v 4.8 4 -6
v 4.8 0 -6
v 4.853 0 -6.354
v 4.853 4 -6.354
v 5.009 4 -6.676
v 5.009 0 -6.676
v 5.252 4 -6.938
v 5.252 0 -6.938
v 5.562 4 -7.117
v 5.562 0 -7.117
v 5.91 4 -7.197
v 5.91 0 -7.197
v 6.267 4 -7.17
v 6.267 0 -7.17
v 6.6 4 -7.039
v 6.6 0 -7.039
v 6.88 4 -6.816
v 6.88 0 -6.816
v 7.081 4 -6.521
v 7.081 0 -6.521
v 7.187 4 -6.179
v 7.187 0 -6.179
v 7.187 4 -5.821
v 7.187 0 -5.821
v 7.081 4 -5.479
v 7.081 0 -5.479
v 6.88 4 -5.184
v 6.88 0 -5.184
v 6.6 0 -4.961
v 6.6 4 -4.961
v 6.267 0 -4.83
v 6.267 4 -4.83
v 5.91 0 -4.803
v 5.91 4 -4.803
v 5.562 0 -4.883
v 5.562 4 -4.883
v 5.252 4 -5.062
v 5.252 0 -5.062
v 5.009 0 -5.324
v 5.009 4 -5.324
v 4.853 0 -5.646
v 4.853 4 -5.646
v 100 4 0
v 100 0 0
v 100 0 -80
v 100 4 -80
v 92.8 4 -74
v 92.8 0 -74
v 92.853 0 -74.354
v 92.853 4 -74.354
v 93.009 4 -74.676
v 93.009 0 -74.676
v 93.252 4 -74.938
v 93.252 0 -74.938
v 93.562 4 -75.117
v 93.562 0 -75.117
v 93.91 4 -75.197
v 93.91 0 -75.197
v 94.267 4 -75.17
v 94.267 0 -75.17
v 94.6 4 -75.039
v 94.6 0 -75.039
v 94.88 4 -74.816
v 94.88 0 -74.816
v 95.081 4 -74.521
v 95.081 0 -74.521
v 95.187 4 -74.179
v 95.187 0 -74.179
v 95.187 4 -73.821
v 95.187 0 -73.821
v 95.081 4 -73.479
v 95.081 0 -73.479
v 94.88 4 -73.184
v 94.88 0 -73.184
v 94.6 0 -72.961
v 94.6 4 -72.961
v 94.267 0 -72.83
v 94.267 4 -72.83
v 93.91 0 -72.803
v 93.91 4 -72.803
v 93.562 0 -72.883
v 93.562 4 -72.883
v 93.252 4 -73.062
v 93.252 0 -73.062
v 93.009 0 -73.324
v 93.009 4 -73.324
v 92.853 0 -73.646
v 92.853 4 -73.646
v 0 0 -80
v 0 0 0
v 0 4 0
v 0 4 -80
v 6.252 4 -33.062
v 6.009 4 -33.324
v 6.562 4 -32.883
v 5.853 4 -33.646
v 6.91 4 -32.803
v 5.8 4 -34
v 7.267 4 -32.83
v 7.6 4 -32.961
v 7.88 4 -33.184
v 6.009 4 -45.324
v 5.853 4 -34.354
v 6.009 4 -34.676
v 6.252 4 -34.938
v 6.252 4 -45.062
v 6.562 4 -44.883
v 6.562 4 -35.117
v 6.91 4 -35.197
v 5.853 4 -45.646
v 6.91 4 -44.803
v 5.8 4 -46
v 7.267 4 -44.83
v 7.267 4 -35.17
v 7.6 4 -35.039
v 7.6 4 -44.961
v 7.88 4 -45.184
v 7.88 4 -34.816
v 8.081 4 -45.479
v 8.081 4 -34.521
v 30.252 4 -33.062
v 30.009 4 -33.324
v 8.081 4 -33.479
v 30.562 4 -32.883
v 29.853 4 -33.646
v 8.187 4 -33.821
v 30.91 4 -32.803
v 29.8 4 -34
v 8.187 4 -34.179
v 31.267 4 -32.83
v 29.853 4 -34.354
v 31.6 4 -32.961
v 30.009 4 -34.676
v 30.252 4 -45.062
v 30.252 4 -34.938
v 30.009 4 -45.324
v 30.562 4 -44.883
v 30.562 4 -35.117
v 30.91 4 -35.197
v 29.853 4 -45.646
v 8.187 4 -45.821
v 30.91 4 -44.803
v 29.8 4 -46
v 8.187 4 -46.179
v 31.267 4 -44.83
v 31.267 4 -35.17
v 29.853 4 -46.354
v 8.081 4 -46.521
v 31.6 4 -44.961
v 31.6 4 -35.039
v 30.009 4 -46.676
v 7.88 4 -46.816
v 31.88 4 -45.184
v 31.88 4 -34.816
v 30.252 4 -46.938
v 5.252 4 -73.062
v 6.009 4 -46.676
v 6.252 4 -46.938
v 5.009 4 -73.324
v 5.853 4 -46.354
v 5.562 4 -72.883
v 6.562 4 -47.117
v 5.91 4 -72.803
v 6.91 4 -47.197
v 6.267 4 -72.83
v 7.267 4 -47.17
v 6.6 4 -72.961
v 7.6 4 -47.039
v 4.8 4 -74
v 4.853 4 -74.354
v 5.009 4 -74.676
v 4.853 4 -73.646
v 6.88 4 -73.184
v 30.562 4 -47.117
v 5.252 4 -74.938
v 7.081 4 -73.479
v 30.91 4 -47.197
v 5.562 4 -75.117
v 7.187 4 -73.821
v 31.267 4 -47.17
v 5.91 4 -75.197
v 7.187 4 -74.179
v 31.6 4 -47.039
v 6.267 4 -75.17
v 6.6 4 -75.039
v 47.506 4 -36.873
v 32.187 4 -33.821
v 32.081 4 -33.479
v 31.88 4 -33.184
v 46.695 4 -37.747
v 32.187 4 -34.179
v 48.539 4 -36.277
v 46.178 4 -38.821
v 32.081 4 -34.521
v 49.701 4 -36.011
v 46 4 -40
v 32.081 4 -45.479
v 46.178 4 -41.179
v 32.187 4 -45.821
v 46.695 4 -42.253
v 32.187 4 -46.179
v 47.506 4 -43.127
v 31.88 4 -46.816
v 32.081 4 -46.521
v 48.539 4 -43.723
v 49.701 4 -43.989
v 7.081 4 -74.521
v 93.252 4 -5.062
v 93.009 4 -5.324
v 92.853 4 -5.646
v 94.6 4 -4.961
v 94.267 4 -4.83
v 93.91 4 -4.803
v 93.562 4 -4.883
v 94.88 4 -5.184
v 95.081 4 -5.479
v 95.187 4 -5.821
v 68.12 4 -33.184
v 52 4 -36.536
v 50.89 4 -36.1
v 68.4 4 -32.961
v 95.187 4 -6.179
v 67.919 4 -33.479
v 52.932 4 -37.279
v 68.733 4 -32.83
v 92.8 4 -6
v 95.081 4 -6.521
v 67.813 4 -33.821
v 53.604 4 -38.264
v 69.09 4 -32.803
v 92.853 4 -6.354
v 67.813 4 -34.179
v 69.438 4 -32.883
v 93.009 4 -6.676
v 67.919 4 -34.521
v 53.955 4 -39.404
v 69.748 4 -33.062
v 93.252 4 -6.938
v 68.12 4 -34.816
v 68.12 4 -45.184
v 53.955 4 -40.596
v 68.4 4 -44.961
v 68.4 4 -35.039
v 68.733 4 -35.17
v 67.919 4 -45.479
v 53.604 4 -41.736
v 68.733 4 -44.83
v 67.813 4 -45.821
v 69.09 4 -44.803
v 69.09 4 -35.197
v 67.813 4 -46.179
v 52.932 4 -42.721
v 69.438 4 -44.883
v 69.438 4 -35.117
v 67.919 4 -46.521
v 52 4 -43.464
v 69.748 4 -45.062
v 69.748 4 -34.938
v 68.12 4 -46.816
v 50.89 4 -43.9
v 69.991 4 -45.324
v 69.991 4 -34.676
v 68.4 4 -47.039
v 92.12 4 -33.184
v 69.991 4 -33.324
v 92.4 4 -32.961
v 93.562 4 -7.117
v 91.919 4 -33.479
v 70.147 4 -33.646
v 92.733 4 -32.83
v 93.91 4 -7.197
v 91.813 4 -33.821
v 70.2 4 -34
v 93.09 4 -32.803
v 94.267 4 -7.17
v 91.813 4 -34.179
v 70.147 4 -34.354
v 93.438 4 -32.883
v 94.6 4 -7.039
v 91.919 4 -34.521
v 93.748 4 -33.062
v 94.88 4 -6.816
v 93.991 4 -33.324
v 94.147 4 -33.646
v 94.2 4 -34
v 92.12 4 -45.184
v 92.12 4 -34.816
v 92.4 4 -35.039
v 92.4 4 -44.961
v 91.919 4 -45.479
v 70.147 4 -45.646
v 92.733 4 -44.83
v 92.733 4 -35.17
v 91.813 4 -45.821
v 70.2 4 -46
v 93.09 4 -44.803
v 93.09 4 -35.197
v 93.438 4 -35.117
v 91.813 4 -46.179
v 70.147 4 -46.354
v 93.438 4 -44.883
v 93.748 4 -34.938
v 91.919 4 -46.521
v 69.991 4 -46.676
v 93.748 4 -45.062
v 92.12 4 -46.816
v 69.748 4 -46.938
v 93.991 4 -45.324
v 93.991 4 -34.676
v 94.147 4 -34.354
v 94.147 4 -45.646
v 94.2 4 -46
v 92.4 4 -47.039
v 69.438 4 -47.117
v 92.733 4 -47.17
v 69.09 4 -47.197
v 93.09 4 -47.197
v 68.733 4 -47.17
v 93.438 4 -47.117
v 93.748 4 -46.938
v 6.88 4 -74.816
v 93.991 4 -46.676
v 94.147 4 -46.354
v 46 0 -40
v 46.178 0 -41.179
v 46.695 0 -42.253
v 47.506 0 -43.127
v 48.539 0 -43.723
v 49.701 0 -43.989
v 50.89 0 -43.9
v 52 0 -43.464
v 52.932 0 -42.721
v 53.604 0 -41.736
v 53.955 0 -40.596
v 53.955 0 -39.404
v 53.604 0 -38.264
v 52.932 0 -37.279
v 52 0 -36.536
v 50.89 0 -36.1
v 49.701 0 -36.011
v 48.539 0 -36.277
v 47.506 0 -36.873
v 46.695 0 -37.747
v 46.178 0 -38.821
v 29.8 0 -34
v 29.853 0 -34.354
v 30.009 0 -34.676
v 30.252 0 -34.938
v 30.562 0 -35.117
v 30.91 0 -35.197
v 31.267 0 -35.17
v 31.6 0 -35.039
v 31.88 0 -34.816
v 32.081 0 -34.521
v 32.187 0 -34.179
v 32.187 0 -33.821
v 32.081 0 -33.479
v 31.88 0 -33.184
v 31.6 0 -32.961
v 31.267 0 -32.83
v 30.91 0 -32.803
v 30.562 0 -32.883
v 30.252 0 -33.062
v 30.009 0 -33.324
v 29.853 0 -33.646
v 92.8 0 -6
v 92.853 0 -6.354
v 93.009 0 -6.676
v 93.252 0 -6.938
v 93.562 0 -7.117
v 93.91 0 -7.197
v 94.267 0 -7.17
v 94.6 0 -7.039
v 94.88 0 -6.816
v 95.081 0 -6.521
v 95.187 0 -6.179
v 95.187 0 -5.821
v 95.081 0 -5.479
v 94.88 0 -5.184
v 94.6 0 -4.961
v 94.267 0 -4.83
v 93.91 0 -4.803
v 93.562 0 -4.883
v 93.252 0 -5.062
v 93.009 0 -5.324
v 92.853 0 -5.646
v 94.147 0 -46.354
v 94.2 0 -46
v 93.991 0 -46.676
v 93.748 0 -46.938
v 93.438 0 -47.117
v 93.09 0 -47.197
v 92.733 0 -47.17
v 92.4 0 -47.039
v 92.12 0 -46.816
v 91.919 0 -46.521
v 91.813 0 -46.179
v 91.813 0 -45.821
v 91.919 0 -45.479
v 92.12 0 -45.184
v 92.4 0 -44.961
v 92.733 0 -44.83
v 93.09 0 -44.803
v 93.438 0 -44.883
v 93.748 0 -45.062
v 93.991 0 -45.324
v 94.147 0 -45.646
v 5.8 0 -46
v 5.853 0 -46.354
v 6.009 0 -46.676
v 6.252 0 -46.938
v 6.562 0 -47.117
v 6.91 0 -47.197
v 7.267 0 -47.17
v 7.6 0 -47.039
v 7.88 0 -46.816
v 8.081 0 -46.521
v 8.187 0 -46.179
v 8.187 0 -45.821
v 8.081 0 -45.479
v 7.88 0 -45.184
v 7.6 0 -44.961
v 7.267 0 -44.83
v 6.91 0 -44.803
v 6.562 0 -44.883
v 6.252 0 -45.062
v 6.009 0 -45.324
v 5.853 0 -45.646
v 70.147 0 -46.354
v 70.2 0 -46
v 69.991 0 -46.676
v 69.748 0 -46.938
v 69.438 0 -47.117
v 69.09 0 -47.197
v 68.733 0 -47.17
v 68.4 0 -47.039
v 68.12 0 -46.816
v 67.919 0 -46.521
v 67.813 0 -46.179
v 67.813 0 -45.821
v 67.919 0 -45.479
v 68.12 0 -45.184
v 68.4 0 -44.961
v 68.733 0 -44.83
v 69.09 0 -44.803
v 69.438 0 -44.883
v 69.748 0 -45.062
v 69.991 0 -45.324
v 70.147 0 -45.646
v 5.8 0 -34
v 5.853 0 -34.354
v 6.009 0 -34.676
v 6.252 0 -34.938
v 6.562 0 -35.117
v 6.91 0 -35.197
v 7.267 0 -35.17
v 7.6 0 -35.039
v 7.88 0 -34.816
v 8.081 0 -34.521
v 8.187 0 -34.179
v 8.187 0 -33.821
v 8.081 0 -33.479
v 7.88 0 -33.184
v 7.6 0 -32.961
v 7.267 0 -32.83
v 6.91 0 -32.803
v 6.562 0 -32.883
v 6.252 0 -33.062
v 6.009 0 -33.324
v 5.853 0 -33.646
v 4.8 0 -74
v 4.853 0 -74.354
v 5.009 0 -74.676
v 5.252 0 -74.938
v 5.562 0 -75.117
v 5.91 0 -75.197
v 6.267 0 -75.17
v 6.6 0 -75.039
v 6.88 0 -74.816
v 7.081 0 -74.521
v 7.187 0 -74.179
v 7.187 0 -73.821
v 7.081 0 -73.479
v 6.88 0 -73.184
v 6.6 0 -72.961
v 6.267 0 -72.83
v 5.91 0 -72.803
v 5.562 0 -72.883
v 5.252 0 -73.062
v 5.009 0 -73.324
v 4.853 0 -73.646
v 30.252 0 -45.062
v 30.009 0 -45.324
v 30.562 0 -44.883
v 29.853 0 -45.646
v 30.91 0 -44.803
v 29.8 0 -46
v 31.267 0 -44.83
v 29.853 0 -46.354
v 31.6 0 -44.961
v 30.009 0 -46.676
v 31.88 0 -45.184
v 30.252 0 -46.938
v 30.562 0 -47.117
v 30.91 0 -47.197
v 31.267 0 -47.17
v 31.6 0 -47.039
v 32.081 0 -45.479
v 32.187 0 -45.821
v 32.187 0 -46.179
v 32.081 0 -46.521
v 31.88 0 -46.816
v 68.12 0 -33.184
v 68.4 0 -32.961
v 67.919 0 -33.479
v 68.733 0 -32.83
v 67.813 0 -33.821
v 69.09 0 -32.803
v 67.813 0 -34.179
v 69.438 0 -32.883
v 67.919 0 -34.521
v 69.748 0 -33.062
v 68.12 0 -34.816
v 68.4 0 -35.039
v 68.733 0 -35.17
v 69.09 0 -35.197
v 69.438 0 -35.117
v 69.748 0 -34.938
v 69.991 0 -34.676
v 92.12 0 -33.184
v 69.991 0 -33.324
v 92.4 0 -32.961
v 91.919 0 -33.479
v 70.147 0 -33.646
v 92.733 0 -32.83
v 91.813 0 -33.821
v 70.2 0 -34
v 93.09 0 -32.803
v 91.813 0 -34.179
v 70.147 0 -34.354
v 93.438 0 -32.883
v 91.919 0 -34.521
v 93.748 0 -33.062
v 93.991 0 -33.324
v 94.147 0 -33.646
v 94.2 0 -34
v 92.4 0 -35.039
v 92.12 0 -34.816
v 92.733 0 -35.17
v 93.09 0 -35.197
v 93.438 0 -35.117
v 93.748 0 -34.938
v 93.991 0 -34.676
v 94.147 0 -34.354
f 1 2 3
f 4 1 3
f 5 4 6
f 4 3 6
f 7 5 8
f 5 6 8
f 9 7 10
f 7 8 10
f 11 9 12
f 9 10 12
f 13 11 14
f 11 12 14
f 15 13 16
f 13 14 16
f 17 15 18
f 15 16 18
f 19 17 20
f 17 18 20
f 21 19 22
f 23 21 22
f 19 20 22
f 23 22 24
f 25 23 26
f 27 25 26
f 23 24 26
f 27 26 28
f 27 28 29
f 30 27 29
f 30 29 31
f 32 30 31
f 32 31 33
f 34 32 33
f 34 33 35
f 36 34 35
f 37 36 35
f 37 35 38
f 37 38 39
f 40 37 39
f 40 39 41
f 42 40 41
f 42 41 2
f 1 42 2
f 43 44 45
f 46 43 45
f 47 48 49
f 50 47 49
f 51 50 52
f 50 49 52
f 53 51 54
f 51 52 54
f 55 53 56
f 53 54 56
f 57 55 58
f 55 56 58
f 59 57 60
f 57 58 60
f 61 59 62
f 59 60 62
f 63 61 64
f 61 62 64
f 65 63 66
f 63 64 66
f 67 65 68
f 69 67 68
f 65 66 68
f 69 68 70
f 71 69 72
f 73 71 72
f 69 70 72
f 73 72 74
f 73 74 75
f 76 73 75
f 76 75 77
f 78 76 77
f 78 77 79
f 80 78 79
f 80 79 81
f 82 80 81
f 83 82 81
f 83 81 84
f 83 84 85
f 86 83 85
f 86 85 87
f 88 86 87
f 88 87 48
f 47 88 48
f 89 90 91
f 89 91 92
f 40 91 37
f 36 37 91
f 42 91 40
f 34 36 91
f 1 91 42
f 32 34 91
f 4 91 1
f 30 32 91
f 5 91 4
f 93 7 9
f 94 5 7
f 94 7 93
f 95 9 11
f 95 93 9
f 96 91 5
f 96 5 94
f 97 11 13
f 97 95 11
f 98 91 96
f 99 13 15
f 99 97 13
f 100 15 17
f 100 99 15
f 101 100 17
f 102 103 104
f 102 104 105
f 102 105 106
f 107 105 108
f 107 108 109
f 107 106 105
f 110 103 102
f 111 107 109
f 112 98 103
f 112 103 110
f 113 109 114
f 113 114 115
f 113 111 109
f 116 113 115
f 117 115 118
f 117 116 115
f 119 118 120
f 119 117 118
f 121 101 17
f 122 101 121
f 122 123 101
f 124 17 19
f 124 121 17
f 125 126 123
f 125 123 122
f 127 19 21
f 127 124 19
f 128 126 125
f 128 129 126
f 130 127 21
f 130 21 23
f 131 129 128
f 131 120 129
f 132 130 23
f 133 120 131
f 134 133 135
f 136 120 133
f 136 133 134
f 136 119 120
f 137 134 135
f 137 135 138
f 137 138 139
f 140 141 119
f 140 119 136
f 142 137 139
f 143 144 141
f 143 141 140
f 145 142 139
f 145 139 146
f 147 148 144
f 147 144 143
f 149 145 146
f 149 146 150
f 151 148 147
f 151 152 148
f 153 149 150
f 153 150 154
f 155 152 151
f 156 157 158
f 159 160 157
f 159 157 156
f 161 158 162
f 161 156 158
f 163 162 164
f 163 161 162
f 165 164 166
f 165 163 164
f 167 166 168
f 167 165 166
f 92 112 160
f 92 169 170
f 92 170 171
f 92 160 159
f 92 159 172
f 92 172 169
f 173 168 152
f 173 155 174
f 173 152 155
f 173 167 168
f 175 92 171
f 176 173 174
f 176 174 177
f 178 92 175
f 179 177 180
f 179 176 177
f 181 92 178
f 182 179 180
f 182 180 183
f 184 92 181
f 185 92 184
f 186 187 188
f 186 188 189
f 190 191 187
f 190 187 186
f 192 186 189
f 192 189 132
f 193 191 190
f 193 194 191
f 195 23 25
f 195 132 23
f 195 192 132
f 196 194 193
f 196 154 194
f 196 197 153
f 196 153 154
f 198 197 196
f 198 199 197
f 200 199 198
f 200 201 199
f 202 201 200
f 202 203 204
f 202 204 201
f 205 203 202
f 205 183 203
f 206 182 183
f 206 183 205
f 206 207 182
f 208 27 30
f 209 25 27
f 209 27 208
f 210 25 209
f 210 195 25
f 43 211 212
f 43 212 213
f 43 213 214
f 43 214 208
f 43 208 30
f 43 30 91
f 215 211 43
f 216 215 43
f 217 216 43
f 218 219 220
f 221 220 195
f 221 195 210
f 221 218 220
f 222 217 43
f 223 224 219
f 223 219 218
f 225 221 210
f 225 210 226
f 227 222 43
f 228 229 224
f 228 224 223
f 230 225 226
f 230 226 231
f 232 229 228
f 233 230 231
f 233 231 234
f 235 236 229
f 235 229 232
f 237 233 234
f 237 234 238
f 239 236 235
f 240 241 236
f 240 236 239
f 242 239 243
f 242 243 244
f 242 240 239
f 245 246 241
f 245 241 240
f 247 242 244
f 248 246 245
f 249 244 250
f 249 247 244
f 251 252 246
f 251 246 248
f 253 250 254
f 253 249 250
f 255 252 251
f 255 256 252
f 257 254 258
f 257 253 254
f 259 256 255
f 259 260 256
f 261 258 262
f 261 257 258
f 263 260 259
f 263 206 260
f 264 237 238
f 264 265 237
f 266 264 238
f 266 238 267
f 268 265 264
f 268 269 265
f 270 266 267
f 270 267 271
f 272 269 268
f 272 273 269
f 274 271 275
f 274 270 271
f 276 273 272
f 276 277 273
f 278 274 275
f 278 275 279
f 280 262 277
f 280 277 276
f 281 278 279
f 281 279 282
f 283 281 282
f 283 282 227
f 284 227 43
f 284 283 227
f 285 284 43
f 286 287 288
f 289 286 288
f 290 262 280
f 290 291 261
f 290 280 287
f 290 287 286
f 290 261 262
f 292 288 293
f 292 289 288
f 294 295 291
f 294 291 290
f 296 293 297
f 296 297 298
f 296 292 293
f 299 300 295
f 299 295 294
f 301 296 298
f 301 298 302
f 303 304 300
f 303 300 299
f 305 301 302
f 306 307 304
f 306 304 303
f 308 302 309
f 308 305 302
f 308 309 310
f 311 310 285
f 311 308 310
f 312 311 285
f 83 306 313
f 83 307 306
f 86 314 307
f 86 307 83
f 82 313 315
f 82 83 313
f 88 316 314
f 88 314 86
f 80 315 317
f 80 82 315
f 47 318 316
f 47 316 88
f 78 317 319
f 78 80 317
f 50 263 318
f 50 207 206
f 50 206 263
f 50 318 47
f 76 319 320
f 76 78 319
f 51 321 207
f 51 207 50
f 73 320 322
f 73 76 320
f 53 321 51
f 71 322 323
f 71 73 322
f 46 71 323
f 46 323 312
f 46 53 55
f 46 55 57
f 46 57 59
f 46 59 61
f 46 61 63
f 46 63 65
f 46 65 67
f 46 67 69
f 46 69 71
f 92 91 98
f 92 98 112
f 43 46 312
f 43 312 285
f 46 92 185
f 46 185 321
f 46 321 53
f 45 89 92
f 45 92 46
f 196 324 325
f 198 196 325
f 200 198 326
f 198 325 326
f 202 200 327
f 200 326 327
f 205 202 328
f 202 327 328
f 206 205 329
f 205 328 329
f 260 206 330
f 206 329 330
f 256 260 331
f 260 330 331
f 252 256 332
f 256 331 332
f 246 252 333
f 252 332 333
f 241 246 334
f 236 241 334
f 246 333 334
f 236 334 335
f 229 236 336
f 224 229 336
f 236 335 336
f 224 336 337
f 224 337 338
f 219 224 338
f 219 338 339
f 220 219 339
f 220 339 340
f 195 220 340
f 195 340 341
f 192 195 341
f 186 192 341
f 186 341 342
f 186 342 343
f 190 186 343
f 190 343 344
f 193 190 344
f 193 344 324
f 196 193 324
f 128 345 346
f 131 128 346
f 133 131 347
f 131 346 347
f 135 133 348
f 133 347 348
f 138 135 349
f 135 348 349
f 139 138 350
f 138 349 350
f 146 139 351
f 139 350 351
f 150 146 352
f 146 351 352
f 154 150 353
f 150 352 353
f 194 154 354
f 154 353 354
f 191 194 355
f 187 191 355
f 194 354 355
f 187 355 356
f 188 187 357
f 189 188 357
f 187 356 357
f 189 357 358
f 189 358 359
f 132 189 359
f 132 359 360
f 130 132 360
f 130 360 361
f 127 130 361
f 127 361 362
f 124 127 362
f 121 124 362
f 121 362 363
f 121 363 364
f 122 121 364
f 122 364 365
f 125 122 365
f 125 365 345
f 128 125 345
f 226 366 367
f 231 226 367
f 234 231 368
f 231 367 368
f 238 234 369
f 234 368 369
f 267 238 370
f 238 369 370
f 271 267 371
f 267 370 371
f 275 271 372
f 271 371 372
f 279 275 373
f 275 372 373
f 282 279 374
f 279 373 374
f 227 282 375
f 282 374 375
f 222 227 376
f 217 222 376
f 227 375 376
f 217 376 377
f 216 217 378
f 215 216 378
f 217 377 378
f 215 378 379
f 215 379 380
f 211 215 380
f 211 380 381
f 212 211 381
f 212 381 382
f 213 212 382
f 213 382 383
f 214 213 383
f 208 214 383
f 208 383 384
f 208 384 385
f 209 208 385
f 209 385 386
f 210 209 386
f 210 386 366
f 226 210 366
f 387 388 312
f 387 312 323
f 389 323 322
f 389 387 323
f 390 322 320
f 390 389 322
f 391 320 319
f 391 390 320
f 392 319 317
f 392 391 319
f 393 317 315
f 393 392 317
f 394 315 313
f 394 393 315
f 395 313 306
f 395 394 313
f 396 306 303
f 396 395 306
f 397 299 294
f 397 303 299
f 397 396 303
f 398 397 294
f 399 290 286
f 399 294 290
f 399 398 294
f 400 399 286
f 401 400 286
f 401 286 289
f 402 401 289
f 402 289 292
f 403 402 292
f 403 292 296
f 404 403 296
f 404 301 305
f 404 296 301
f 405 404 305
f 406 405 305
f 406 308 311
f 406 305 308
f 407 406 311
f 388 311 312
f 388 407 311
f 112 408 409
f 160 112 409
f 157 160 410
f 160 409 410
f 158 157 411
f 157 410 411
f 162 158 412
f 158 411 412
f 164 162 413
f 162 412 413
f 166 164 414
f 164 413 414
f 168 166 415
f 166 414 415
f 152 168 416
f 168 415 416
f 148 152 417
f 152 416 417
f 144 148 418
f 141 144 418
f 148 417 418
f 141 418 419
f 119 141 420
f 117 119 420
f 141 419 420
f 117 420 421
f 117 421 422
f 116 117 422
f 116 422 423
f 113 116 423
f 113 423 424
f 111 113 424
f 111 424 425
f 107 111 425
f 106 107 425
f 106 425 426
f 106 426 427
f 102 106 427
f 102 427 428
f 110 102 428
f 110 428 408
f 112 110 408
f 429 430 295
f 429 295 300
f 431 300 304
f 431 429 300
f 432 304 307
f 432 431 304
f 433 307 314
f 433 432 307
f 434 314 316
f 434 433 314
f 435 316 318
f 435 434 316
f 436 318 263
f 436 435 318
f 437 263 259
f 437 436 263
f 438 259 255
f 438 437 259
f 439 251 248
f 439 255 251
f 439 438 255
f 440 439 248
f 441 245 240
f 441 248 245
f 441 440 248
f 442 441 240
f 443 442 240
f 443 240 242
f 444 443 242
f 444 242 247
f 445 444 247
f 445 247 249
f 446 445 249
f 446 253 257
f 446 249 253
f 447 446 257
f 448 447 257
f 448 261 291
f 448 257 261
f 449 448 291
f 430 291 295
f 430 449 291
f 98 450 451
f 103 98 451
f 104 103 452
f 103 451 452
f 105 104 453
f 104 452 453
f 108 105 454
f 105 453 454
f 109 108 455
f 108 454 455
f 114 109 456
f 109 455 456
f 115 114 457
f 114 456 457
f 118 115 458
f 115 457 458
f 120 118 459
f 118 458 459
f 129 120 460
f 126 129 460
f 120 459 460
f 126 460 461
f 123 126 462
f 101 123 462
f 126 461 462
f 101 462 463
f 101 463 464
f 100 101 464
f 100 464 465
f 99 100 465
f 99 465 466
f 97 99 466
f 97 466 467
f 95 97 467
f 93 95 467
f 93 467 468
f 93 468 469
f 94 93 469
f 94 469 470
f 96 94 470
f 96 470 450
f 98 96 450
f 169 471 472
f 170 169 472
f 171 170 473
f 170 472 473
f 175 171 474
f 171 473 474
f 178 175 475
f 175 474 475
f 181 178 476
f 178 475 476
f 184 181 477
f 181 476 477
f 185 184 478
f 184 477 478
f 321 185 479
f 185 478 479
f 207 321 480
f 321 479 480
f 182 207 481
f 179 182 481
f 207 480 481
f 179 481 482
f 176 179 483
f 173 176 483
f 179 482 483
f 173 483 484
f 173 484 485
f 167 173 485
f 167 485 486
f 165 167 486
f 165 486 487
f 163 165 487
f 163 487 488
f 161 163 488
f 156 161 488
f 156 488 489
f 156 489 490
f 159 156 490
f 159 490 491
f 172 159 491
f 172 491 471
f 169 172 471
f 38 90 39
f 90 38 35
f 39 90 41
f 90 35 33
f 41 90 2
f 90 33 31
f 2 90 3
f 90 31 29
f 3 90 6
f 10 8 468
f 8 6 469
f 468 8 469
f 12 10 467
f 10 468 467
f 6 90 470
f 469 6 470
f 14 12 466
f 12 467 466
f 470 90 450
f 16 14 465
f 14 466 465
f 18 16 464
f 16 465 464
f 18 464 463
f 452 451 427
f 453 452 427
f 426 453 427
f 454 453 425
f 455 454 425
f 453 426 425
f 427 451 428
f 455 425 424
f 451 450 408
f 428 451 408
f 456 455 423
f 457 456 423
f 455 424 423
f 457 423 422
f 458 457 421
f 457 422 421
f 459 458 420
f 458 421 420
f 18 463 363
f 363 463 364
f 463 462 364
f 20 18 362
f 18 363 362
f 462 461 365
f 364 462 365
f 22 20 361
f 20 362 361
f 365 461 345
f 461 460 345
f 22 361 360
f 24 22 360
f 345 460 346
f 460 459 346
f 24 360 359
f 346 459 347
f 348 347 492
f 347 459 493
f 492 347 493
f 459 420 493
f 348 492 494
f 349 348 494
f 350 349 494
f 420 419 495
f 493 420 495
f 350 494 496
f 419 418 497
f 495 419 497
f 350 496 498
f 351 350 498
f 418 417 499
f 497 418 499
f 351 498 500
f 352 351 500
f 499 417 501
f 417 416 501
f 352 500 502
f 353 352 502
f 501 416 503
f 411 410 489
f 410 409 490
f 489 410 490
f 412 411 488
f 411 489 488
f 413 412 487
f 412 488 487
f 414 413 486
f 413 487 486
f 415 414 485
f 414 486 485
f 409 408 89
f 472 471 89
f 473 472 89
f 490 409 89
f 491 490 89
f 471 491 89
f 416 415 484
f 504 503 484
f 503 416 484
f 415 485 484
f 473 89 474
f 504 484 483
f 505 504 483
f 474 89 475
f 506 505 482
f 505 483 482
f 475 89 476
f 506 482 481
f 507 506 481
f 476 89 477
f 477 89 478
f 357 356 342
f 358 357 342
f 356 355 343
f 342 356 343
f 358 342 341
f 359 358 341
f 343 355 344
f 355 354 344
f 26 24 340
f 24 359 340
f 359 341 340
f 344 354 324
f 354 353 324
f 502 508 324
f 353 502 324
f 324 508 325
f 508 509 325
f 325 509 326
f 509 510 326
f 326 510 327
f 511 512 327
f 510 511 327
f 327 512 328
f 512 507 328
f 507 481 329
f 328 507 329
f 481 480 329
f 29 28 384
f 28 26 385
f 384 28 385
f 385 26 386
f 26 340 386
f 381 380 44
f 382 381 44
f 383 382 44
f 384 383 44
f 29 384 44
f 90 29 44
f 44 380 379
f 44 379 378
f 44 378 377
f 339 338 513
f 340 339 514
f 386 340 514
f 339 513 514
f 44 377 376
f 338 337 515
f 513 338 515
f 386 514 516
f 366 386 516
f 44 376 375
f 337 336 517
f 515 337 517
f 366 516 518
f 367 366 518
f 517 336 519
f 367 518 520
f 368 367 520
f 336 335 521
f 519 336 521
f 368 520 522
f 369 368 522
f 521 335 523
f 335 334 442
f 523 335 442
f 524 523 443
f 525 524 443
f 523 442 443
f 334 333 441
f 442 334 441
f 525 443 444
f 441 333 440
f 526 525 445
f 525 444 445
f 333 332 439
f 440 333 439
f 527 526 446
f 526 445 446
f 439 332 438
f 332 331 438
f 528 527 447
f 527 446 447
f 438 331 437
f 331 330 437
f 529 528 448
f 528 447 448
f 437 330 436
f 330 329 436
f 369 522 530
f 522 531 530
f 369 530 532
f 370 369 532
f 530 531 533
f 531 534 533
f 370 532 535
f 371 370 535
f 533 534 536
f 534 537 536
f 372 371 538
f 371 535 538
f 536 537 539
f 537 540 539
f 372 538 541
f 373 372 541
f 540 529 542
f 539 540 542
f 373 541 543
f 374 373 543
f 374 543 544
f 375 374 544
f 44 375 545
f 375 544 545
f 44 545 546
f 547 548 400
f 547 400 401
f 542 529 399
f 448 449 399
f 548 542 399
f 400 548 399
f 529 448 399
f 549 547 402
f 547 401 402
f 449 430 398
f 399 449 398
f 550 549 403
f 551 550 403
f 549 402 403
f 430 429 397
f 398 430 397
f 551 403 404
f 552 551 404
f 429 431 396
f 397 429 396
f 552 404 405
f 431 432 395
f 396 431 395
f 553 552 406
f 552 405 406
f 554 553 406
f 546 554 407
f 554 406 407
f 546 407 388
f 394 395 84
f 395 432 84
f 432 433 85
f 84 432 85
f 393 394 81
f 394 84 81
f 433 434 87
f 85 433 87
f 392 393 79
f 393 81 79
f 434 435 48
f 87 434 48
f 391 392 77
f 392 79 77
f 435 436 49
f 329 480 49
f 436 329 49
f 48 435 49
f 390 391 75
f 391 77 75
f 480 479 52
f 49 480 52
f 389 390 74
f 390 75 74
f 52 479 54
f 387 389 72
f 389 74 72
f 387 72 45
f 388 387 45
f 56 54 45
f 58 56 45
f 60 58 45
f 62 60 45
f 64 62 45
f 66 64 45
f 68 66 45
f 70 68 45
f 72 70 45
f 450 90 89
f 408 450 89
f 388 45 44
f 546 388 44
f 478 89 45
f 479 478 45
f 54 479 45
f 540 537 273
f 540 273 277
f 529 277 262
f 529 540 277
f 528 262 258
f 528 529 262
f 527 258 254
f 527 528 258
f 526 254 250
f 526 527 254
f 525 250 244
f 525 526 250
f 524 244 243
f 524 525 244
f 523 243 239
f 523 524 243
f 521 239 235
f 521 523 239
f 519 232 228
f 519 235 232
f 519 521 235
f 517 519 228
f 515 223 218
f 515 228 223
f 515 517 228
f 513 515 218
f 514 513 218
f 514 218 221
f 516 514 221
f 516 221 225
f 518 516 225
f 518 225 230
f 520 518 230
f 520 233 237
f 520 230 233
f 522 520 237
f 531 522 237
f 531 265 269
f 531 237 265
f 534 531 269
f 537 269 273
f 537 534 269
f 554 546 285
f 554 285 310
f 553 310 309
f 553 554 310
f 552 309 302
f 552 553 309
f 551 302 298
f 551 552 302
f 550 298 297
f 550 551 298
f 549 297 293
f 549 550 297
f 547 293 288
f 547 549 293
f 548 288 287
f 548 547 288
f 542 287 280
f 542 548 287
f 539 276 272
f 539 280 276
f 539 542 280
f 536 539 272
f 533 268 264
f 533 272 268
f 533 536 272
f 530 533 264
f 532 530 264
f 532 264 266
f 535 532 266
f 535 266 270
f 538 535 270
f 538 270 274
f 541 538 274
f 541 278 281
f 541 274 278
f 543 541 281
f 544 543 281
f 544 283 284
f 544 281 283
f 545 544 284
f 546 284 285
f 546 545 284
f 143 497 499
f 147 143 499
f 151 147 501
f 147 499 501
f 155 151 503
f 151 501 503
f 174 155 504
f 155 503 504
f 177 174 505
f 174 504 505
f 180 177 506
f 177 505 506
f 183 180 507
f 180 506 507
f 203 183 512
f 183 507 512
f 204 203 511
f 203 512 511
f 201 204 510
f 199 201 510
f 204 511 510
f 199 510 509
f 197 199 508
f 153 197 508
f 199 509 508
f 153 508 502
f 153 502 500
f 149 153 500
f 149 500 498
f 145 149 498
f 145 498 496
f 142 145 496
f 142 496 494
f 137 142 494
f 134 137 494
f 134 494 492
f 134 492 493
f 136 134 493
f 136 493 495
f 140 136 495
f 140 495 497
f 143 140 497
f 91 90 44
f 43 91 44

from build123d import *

# Parameters (mm, degrees)
SKETCH1_W                = 100
SKETCH1_H                = 80
BOSS_EXTRUDE1_DEPTH      = 4
M2_CLEARANCE_HOLE1_D     = 2.4
M2_CLEARANCE_HOLE1_DEPTH = 6
M2_CLEARANCE_HOLE2_D     = 2.4
M2_CLEARANCE_HOLE2_DEPTH = 6
F_8_0MM_DOWEL_HOLE1_D    = 8


with BuildPart() as part:
    # Sketch1 → Boss-Extrude1 (new body)
    with BuildSketch(Plane(origin=(0, 0, 0), x_dir=(1, 0, 0), z_dir=(0, 1, 0))):
        with Locations((50, 40)):
            Rectangle(SKETCH1_W, SKETCH1_H)
    extrude(amount=BOSS_EXTRUDE1_DEPTH)

    # M2 Clearance Hole1
    with Locations(Plane(origin=(0, 4, 0), x_dir=(1, 0, 0), z_dir=(0, 1, 0))):
        with Locations((7, 34), (31, 34), (31, 46), (7, 46)):
            m2_clearance_hole1 = Hole(M2_CLEARANCE_HOLE1_D / 2, depth=M2_CLEARANCE_HOLE1_DEPTH)

    # Mirror1: M2 Clearance Hole1 across plane
    add(m2_clearance_hole1.mirror(Plane.ZY.offset(-50)), mode=Mode.SUBTRACT)

    # M2 Clearance Hole2
    with Locations(Plane(origin=(0, 4, 0), x_dir=(1, 0, 0), z_dir=(0, 1, 0))):
        with Locations((6, 74), (94, 74), (94, 6), (6, 6)):
            Hole(M2_CLEARANCE_HOLE2_D / 2, depth=M2_CLEARANCE_HOLE2_DEPTH)

    # Ø8.0mm Dowel Hole1 (through all)
    with Locations(Plane(origin=(0, 4, 0), x_dir=(1, 0, 0), z_dir=(0, 1, 0))):
        with Locations((50, 40)):
            Hole(F_8_0MM_DOWEL_HOLE1_D / 2)


solid = part.part
